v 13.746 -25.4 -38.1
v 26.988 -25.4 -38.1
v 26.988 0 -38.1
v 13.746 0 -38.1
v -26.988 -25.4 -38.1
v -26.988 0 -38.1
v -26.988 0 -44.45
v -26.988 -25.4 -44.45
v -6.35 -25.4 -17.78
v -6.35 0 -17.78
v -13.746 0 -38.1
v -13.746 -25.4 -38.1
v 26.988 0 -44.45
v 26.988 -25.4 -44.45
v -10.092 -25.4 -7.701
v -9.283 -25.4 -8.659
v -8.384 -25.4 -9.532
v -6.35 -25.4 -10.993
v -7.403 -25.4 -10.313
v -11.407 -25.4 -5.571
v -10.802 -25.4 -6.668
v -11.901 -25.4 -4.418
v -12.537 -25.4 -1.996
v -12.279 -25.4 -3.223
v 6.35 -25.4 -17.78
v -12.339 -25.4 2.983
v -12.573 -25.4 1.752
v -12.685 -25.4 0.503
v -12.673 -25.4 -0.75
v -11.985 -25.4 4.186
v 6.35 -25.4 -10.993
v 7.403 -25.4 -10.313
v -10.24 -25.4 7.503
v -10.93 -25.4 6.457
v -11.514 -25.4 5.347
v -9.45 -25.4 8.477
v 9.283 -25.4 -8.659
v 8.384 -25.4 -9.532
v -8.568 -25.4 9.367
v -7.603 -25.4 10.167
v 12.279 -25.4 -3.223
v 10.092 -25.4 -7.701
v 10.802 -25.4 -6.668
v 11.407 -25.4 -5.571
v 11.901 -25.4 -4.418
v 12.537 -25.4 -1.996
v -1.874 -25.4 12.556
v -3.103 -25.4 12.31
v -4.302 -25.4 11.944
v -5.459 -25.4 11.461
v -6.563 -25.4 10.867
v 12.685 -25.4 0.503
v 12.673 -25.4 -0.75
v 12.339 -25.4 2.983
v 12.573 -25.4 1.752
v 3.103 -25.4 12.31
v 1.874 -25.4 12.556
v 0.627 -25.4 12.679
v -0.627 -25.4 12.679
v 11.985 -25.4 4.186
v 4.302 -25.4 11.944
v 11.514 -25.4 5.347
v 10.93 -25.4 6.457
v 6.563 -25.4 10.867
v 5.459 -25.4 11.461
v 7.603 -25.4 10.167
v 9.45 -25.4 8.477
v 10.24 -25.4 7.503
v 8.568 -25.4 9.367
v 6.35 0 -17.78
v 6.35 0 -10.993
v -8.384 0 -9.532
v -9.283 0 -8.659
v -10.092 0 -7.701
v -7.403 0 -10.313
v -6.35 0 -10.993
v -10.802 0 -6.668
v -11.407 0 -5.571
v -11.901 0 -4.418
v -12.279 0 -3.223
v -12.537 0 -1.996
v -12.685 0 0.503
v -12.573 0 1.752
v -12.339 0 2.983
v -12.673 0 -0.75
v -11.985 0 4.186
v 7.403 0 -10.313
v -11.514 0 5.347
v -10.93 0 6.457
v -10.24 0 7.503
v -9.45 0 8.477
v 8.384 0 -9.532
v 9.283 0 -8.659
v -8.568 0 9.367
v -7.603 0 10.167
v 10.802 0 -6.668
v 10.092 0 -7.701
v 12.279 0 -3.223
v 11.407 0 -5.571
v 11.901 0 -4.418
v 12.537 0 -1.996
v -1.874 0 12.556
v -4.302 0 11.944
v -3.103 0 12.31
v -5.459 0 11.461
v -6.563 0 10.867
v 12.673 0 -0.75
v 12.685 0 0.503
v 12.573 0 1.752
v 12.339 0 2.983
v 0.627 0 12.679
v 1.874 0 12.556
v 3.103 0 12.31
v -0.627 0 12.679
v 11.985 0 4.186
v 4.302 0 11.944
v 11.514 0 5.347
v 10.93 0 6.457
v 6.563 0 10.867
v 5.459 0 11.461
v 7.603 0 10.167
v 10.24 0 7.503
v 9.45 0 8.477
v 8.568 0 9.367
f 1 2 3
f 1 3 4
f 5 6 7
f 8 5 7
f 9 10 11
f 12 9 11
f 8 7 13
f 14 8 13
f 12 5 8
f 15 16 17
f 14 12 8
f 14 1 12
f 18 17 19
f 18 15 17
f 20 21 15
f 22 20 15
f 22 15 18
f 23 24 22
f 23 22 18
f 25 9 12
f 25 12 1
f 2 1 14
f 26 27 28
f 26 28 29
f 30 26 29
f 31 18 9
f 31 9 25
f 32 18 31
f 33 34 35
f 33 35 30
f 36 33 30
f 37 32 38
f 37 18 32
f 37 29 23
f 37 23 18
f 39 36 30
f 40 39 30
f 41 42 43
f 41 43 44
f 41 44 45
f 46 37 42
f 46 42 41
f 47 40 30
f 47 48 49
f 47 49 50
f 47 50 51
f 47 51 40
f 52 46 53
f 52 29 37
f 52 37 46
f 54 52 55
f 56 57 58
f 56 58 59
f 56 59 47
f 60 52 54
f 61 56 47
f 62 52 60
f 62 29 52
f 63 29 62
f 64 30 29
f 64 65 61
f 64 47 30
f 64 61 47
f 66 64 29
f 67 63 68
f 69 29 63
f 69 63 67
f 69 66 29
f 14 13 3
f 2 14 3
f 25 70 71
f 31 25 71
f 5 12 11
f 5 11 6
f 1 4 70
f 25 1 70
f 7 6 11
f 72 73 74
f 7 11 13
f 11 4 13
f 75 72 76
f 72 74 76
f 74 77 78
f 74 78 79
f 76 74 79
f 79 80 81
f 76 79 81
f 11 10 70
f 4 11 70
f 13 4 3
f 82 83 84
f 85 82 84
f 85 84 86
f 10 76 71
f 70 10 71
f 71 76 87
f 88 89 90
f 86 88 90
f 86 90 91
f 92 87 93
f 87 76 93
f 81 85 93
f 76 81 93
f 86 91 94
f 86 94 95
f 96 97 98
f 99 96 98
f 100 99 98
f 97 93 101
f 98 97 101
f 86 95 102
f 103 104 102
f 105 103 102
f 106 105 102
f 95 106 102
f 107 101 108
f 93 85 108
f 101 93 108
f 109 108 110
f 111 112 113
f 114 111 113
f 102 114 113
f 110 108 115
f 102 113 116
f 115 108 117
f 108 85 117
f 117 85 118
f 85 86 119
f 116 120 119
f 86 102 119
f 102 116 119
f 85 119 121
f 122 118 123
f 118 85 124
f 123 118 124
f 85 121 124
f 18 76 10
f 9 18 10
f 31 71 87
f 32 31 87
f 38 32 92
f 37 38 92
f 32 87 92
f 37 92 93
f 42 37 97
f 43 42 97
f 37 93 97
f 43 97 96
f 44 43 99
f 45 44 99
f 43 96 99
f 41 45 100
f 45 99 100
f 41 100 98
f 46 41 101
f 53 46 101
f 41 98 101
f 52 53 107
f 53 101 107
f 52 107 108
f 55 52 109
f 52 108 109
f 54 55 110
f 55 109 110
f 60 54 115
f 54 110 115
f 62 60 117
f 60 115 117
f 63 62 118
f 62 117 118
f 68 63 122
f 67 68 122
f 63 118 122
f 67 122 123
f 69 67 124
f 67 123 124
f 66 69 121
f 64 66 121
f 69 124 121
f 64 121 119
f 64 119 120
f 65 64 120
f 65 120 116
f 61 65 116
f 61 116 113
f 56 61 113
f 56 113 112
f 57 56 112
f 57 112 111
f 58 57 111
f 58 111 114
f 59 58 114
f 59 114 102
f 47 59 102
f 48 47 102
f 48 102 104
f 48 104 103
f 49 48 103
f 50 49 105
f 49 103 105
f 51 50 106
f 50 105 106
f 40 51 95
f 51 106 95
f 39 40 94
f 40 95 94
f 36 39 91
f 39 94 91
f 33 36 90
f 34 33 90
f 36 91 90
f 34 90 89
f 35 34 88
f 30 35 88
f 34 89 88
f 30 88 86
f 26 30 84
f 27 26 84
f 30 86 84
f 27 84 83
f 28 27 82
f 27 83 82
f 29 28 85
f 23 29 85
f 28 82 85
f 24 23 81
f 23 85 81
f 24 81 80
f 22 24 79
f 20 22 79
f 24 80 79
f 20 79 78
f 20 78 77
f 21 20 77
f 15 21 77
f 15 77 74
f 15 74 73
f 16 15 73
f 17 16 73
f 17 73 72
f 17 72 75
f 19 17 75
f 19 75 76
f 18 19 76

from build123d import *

# Parameters (mm, degrees)
F1_DEPTH = 25.4


with BuildPart() as f1:
    # F0 (on Front) → F1 (new body)
    with BuildSketch(Plane.XZ):
        with BuildLine():
            Line((6.35, -17.78), (6.35, -10.992656))
            ThreePointArc((6.35, -10.992656), (0, 12.69492), (-6.35, -10.992656))
            Line((-6.35, -10.992656), (-6.35, -17.78))
            Line((-6.35, -17.78), (-13.745875, -38.1))
            Line((-13.745875, -38.1), (-26.9875, -38.1))
            Line((-26.9875, -38.1), (-26.9875, -44.45))
            Line((-26.9875, -44.45), (26.9875, -44.45))
            Line((26.9875, -44.45), (26.9875, -38.1))
            Line((26.9875, -38.1), (13.745875, -38.1))
            Line((13.745875, -38.1), (6.35, -17.78))
        make_face()
    extrude(amount=F1_DEPTH)


solid = f1.part
